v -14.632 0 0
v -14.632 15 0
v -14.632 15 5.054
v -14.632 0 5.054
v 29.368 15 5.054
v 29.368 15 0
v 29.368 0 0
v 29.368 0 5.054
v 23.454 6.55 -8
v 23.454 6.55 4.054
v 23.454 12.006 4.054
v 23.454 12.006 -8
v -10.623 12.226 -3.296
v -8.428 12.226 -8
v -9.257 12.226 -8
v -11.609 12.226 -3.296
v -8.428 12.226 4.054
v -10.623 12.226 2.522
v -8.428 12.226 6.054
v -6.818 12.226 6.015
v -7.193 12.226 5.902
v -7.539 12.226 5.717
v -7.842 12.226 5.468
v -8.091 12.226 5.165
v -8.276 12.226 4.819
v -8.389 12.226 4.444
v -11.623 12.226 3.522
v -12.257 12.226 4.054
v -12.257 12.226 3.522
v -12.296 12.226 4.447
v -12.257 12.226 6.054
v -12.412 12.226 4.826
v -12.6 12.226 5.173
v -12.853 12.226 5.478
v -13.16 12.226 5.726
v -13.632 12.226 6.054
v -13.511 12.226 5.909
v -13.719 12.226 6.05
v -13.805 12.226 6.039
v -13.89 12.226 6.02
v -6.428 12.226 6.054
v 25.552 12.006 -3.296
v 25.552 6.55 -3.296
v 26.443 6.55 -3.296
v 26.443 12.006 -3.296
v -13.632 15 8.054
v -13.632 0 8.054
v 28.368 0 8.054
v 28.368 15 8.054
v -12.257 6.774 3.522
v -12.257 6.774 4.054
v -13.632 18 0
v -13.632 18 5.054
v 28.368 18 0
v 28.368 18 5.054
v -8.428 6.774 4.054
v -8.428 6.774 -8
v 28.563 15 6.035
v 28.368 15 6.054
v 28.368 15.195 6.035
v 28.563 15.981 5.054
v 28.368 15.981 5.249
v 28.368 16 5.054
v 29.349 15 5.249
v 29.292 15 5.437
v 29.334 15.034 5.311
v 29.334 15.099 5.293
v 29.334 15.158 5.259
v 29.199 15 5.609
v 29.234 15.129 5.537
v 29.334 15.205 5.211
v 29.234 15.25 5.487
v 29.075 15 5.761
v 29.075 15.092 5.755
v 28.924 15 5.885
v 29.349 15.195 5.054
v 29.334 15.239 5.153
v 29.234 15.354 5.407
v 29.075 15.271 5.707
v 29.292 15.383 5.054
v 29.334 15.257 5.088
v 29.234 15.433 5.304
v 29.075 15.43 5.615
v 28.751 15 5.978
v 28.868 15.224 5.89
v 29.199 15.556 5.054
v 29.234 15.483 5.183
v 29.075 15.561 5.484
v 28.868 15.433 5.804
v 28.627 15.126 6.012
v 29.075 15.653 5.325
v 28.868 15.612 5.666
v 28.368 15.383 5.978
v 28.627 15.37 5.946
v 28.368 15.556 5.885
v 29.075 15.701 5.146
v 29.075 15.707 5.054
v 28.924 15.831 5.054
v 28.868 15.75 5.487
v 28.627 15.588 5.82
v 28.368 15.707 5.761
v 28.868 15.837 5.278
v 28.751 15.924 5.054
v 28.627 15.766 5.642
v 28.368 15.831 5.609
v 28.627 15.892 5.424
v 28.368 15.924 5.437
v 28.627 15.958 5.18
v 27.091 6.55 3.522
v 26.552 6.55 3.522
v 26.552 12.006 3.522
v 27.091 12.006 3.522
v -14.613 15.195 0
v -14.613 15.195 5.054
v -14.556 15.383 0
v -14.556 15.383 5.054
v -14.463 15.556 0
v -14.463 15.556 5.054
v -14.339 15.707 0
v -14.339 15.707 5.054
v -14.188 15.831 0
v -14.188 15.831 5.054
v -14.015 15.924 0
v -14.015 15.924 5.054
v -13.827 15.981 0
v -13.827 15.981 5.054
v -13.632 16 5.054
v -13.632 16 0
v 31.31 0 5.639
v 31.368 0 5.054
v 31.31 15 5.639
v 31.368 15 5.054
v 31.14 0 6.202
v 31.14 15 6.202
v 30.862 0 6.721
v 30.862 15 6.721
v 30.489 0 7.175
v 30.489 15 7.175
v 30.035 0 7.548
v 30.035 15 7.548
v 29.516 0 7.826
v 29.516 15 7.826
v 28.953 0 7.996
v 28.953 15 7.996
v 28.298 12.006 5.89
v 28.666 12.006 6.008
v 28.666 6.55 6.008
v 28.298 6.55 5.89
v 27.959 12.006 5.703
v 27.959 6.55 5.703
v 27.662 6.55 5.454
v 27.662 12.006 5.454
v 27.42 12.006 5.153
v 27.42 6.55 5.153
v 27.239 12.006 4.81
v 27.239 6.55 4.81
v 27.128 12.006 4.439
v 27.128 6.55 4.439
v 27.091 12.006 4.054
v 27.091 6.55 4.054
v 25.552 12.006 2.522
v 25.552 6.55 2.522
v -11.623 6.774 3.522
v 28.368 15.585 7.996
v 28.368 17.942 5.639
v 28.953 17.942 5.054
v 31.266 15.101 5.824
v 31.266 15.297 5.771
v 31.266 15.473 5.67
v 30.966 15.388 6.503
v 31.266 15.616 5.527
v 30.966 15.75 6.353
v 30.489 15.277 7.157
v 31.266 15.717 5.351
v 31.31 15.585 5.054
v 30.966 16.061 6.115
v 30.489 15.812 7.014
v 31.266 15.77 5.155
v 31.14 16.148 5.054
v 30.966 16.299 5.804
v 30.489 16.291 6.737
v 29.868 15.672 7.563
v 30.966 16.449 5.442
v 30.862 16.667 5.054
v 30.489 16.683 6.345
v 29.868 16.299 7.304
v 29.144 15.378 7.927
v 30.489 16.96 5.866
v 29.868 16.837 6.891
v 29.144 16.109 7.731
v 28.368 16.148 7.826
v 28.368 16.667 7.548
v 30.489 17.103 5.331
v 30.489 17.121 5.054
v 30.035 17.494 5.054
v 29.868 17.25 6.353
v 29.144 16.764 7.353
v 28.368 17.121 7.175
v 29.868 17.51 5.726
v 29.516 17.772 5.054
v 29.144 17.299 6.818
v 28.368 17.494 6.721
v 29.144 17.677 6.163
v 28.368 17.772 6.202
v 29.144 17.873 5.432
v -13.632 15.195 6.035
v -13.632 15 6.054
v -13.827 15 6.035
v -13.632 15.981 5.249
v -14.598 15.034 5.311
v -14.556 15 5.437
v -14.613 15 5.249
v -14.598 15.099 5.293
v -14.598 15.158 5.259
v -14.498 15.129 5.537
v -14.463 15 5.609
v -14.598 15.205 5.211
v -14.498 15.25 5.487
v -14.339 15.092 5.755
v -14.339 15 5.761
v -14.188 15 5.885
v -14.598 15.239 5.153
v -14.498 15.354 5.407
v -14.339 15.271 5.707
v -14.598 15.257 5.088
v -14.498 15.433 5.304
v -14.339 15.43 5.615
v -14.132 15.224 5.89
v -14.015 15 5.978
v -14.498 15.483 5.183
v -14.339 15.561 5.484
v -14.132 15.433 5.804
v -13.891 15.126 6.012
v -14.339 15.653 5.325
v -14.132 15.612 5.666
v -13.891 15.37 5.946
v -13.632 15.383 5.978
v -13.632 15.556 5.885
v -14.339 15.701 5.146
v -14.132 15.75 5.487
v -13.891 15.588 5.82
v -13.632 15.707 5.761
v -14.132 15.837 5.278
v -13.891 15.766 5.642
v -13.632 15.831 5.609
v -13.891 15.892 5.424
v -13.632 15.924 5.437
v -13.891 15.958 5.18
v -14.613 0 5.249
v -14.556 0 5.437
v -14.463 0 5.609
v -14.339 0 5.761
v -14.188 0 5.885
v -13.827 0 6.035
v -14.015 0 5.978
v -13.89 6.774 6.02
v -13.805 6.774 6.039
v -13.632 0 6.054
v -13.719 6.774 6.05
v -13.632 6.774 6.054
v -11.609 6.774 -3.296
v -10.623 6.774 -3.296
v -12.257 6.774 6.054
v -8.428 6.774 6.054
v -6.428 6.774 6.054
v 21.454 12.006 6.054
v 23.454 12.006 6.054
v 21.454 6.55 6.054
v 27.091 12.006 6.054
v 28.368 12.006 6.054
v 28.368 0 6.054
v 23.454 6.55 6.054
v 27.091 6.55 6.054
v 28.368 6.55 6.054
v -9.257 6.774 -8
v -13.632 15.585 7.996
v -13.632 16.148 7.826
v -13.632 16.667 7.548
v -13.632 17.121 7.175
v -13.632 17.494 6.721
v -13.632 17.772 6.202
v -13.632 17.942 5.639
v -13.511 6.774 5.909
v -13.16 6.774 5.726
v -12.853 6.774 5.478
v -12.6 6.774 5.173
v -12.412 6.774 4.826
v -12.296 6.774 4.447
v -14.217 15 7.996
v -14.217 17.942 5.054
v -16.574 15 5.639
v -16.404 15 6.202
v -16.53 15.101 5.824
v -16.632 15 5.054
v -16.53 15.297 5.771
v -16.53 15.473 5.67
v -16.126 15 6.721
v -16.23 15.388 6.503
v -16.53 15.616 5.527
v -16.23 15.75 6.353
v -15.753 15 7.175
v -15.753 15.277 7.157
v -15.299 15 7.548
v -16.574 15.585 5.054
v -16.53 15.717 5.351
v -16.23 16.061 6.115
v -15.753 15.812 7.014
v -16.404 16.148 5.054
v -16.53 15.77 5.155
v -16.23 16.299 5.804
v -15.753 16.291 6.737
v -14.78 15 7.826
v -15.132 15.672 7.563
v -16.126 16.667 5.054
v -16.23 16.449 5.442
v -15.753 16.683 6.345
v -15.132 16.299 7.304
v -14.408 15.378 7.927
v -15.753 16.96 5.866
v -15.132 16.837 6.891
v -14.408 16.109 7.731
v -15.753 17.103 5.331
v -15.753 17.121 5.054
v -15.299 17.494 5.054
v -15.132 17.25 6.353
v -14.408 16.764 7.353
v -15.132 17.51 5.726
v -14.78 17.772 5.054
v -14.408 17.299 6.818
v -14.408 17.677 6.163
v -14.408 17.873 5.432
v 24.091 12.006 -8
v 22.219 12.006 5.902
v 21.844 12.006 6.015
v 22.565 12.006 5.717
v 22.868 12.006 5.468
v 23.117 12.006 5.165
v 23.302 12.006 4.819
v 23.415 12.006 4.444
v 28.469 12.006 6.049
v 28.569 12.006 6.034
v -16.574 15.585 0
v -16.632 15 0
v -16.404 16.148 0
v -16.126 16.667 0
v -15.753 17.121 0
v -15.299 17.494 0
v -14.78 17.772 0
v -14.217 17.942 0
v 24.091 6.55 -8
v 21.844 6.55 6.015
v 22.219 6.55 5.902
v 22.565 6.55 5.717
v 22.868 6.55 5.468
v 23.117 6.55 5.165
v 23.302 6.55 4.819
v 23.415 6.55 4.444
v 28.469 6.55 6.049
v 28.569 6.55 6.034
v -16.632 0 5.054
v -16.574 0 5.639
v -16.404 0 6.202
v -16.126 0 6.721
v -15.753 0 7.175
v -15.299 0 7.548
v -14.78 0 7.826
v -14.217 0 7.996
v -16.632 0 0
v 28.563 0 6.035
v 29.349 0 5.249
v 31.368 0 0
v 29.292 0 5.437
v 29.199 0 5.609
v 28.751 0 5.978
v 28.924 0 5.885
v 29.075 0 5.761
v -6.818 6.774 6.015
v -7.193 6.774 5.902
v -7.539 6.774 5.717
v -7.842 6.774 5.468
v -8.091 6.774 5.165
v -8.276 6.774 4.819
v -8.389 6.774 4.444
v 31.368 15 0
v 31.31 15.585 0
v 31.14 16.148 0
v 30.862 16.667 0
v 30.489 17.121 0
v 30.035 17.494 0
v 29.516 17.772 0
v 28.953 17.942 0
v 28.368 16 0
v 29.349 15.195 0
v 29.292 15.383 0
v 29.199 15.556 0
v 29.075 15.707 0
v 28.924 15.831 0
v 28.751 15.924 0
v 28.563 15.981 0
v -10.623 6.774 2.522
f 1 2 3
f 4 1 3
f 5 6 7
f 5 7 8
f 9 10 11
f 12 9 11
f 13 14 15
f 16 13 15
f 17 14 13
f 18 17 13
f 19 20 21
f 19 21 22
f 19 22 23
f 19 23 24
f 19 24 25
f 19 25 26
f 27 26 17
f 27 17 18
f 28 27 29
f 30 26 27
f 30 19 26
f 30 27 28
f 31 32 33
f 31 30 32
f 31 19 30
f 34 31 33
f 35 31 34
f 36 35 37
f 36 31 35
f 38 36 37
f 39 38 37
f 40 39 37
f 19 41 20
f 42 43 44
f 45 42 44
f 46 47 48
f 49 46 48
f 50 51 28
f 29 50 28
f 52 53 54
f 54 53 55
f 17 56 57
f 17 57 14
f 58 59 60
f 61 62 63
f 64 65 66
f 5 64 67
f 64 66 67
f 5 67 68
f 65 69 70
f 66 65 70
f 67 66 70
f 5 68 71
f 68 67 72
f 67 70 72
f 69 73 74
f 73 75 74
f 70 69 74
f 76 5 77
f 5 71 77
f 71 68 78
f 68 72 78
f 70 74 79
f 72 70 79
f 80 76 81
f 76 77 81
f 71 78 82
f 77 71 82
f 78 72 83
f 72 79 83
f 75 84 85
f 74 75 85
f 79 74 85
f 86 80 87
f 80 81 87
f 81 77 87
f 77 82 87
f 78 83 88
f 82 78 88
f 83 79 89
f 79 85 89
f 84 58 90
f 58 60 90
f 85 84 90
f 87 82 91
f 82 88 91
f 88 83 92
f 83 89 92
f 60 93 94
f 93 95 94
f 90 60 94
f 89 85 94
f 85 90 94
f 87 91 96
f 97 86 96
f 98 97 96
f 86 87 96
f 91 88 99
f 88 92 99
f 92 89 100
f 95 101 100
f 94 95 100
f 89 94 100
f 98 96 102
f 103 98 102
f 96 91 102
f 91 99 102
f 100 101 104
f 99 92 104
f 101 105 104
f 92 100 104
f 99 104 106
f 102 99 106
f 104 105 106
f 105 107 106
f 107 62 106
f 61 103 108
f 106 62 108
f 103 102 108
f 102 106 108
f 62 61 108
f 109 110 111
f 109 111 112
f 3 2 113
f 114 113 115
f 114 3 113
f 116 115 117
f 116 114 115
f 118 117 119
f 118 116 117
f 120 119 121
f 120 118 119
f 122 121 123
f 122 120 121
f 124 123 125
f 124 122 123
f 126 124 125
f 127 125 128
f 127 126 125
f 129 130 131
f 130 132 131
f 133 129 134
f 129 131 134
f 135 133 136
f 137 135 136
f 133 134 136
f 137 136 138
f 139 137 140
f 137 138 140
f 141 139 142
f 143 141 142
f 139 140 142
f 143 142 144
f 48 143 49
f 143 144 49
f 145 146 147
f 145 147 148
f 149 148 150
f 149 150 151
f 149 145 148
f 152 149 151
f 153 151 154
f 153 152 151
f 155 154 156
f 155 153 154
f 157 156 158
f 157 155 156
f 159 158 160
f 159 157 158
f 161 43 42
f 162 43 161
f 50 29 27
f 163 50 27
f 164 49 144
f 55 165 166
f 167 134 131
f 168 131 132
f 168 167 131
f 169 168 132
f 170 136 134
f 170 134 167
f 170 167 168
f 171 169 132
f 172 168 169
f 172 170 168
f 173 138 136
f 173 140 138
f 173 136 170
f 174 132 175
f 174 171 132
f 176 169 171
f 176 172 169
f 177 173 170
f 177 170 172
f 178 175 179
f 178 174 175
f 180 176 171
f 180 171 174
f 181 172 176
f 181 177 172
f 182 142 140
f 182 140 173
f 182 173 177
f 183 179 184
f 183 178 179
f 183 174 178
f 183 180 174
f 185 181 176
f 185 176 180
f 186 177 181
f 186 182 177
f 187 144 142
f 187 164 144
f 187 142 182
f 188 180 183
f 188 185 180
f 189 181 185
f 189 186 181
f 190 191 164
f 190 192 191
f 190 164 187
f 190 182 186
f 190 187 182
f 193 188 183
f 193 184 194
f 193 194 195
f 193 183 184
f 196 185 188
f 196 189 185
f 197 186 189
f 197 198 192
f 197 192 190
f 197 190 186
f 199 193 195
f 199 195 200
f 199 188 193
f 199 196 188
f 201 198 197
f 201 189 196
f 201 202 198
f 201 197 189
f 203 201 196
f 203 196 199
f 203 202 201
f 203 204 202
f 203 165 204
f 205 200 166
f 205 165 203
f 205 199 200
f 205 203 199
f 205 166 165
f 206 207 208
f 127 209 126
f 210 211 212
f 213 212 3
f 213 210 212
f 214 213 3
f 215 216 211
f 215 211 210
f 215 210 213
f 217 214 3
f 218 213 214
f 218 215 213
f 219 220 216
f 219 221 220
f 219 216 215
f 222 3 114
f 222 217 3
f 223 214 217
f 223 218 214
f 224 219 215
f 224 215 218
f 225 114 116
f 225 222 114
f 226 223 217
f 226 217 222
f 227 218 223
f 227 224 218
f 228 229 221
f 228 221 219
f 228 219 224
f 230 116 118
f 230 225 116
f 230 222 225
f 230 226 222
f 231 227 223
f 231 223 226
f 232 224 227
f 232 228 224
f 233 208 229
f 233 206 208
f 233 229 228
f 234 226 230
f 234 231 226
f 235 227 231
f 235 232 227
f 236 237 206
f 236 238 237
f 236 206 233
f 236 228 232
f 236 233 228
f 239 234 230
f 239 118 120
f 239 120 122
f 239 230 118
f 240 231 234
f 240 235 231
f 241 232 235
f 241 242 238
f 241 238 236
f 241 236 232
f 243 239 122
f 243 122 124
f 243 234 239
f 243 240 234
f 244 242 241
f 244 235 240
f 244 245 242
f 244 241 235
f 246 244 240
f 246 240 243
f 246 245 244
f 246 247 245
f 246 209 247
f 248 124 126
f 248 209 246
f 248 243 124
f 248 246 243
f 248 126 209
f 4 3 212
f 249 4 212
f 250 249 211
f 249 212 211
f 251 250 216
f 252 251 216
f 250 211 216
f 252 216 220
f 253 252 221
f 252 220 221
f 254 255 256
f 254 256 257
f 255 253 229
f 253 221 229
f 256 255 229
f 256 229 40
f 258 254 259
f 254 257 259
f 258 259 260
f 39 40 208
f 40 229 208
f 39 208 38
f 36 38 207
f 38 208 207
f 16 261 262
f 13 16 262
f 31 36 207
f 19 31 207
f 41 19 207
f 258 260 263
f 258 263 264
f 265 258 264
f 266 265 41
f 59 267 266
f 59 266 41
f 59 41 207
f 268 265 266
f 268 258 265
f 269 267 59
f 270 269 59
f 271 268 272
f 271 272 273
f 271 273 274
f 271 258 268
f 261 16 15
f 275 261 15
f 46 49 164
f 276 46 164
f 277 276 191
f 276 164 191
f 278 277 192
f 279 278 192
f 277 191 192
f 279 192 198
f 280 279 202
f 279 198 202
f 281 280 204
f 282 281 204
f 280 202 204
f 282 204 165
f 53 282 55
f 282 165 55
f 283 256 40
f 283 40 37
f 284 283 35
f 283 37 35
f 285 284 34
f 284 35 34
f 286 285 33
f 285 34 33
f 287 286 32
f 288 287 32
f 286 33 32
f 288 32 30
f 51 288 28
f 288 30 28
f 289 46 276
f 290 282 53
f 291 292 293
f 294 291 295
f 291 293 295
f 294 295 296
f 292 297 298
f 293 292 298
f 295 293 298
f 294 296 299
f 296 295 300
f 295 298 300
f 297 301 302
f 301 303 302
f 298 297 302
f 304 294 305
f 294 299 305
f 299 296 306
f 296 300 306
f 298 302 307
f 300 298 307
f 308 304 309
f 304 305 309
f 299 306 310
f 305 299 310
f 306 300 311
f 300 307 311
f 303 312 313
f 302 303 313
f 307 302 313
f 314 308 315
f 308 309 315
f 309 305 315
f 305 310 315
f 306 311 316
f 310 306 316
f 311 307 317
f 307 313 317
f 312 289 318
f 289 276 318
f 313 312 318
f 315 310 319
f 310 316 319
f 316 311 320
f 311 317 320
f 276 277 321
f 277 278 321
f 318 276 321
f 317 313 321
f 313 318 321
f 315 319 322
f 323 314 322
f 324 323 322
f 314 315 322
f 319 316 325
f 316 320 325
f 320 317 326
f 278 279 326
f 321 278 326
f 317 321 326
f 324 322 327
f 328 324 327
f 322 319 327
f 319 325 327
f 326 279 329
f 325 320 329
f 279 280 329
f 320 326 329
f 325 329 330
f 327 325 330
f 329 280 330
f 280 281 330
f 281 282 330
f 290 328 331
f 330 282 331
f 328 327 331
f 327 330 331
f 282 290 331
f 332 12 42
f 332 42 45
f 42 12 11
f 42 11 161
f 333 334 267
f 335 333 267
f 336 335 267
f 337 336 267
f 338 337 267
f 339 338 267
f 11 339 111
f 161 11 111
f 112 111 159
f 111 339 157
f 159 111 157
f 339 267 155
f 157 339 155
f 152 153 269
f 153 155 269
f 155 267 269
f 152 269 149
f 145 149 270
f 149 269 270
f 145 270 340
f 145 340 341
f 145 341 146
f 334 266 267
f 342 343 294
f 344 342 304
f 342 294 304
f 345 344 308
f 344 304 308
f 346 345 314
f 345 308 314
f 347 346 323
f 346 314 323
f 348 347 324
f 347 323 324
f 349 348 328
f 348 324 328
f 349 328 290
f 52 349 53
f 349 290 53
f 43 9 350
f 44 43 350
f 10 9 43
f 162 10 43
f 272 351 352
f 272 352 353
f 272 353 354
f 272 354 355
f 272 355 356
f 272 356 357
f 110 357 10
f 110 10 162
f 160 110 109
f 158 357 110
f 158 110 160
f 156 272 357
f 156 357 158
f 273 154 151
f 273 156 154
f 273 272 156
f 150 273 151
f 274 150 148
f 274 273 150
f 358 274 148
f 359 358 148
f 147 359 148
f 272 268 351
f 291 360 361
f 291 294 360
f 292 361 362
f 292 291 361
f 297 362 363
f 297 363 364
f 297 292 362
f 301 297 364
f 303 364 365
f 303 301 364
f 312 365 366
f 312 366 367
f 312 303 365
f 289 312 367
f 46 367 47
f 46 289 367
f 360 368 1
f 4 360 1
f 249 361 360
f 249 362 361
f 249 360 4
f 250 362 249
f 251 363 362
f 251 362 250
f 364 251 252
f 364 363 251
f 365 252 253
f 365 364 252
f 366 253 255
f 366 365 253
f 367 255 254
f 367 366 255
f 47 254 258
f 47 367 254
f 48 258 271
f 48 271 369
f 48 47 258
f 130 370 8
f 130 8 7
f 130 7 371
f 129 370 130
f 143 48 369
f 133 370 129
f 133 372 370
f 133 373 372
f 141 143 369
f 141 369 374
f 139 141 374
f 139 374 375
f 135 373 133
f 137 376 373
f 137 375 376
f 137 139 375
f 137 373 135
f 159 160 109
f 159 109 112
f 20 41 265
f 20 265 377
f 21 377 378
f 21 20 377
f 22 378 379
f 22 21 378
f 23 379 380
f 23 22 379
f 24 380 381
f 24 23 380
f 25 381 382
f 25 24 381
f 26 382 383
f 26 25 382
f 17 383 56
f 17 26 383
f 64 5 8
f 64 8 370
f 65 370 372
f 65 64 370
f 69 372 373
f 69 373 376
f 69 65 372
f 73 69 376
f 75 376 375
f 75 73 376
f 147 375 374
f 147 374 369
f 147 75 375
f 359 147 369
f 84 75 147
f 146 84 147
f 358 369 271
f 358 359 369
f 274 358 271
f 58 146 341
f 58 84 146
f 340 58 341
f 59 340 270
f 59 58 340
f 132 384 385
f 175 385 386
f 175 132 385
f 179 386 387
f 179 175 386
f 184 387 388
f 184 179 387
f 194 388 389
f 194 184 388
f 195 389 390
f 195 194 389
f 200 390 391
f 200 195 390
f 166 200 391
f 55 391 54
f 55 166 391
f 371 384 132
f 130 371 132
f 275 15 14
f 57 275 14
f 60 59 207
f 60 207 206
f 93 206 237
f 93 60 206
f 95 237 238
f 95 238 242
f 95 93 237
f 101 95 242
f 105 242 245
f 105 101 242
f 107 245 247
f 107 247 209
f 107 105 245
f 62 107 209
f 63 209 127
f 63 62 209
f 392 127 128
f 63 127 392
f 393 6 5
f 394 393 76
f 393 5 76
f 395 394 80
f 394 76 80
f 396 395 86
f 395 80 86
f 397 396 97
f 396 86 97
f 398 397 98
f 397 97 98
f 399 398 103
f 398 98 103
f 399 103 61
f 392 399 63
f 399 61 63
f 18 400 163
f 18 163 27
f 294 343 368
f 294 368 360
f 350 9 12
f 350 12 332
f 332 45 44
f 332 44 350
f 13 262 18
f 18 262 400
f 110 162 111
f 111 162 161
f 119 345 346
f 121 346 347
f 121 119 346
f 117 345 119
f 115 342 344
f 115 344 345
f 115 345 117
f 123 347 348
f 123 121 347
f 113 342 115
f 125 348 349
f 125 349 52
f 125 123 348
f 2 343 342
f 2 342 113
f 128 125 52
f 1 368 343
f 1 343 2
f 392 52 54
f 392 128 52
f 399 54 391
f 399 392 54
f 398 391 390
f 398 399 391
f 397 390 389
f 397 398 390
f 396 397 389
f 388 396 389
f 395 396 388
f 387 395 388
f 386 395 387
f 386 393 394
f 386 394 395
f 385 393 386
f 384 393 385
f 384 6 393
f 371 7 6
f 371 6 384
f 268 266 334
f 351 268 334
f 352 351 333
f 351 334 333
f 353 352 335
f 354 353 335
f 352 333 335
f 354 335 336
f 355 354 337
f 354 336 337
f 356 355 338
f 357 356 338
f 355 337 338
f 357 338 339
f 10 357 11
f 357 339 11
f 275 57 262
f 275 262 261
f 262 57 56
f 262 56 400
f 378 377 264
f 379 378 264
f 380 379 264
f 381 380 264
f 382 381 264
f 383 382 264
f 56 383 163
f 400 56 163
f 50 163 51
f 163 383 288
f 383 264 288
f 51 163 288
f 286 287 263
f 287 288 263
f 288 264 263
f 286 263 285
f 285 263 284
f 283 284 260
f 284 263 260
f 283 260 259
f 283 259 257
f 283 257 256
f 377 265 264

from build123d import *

# Parameters (mm, degrees)
F0_W         = 48
F0_H         = 8.0539090559
F1_DEPTH     = 18
F2_R         = 3
F3_T         = -2
F4_W         = 3.6368723959
F4_H         = 5.4553076625
F5_DEPTH     = 8
F6_W         = 3.8294224069
F6_H         = 5.4512945935
F7_DEPTH     = 8
F8_W         = 2.2997260094
F8_H         = 6.8176840032
F9_DEPTH     = 13.4
F8_W_2       = 2.9408568516
F11_T1_DEPTH = 36.529241079
F12_T1_DEPTH = 36.5332541479
F13_T1_DEPTH = 5.4512945935
F13_T3_DEPTH = 5.4553076625
F14_SIZE     = 1


# Not quite as in the source:
# - a fillet or chamfer that OpenCascade refuses, or shapes differently, is made with other operations: its cross-section is extruded or revolved along the edge and cut away or added


with BuildPart() as f1:
    # F0 (on Front) → F1 (new body)
    with BuildSketch(Plane.XZ):
        with Locations((7.3680209219, 4.0269545279)):
            Rectangle(F0_W, F0_H)
    extrude(amount=-F1_DEPTH)

    # F2
    f2_edges = [f1.edges().sort_by_distance(p)[0] for p in [
        (7.368021, 18, 8.053909),
        (-16.631979, 9, 8.053909),
        (31.368021, 9, 8.053909),
        (-16.631979, 18, 4.026955),
        (31.368021, 18, 4.026955),
    ]]
    fillet(f2_edges, radius=F2_R)

    # F3
    f3_openings = [f1.faces().sort_by_distance(p)[0] for p in [
        (7.368021, 0, 3.993074),
        (7.368021, 8.962591, 0),
    ]]
    offset(amount=F3_T, openings=f3_openings)

    # F4 (on Top) → F5 (join, symmetric)
    with BuildSketch(Plane.XY):
        with Locations((25.2722883597, 9.2779155821)):
            Rectangle(F4_W, F4_H)
    extrude(amount=F5_DEPTH, both=True)

    # F6 (on Top) → F7 (join, symmetric)
    with BuildSketch(Plane.XY):
        with Locations((-10.3424843401, 9.4998679124)):
            Rectangle(F6_W, F6_H)
    extrude(amount=F7_DEPTH, both=True)


with BuildPart() as f9:
    # F8 (on Front) → F9 (new body)
    with BuildSketch(Plane.XZ):
        with Locations((26.7013879493, 0.1128966487)):
            Rectangle(F8_W, F8_H)
    extrude(amount=-F9_DEPTH)


with BuildPart() as f9b:
    # F8 (on Front) → F9, piece 2 (new body)
    with BuildSketch(Plane.XZ):
        with Locations((-12.0930257253, 0.1128966487)):
            Rectangle(F8_W_2, F8_H)
    extrude(amount=-F9_DEPTH)


with BuildPart() as f1_1:
    add(f1.part)

    # F10: cut F9, F9b
    add(f9.part, mode=Mode.SUBTRACT)
    add(f9b.part, mode=Mode.SUBTRACT)

    # F11: chamfer of 6 x 3 on 1 edges, made by hand

    # F11_s2 → F11_t1 (cut)
    with BuildSketch(Plane.XZ.offset(-27.7644884519)):
        Polygon((-12.2571955435, -2), (-9.2571955435, -8), (-12.2571955435, -8), align=None)
    extrude(amount=F11_T1_DEPTH, mode=Mode.SUBTRACT)

    # F12: chamfer of 3 x 6 on 1 edges, made by hand

    # F12_s2 → F12_t1 (cut)
    with BuildSketch(Plane.XZ.offset(-27.544542656)):
        Polygon((27.0907245576, -2), (24.0907245576, -8), (27.0907245576, -8), align=None)
    extrude(amount=F12_T1_DEPTH, mode=Mode.SUBTRACT)

    # F13: fillet of radius 2 on 4 edges, made by hand

    # F13_s2 → F13_t1 (join)
    with BuildSketch(Plane.XZ.offset(-12.2255152091)):
        with BuildLine():
            ThreePointArc((-6.4277731366, 6.0539090559), (-7.841986699, 5.4681226183), (-8.4277731366, 4.0539090559))
            Line((-8.4277731366, 4.0539090559), (-8.4677731366, 4.0539090559))
            Line((-8.4677731366, 4.0539090559), (-8.4677731366, 6.0939090559))
            Line((-8.4677731366, 6.0939090559), (-6.4277731366, 6.0939090559))
            Line((-6.4277731366, 6.0939090559), (-6.4277731366, 6.0539090559))
        make_face()
        with BuildLine():
            ThreePointArc((-14.2571955435, 6.0539090559), (-12.8429819811, 5.4681226183), (-12.2571955435, 4.0539090559))
            Line((-12.2571955435, 4.0539090559), (-12.2171955435, 4.0539090559))
            Line((-12.2171955435, 4.0539090559), (-12.2171955435, 6.0939090559))
            Line((-12.2171955435, 6.0939090559), (-14.2571955435, 6.0939090559))
            Line((-14.2571955435, 6.0939090559), (-14.2571955435, 6.0539090559))
        make_face()
    extrude(amount=F13_T1_DEPTH)

    # F13_s4 → F13_t3 (join)
    with BuildSketch(Plane.XZ.offset(-12.0055694133)):
        with BuildLine():
            ThreePointArc((21.4538521618, 6.0539090559), (22.8680657241, 5.4681226183), (23.4538521618, 4.0539090559))
            Line((23.4538521618, 4.0539090559), (23.4938521618, 4.0539090559))
            Line((23.4938521618, 4.0539090559), (23.4938521618, 6.0939090559))
            Line((23.4938521618, 6.0939090559), (21.4538521618, 6.0939090559))
            Line((21.4538521618, 6.0939090559), (21.4538521618, 6.0539090559))
        make_face()
        with BuildLine():
            ThreePointArc((29.0907245576, 6.0539090559), (27.6765109953, 5.4681226183), (27.0907245576, 4.0539090559))
            Line((27.0907245576, 4.0539090559), (27.0507245576, 4.0539090559))
            Line((27.0507245576, 4.0539090559), (27.0507245576, 6.0939090559))
            Line((27.0507245576, 6.0939090559), (29.0907245576, 6.0939090559))
            Line((29.0907245576, 6.0939090559), (29.0907245576, 6.0539090559))
        make_face()
    extrude(amount=F13_T3_DEPTH)

    # F14
    f14_edges = [f1_1.edges().sort_by_distance(p)[0] for p in [
        (25.551525, 9.277916, 3.521739),
        (-10.622597, 9.499868, 3.521739),
    ]]
    chamfer(f14_edges, length=F14_SIZE)


solid = f1_1.part
